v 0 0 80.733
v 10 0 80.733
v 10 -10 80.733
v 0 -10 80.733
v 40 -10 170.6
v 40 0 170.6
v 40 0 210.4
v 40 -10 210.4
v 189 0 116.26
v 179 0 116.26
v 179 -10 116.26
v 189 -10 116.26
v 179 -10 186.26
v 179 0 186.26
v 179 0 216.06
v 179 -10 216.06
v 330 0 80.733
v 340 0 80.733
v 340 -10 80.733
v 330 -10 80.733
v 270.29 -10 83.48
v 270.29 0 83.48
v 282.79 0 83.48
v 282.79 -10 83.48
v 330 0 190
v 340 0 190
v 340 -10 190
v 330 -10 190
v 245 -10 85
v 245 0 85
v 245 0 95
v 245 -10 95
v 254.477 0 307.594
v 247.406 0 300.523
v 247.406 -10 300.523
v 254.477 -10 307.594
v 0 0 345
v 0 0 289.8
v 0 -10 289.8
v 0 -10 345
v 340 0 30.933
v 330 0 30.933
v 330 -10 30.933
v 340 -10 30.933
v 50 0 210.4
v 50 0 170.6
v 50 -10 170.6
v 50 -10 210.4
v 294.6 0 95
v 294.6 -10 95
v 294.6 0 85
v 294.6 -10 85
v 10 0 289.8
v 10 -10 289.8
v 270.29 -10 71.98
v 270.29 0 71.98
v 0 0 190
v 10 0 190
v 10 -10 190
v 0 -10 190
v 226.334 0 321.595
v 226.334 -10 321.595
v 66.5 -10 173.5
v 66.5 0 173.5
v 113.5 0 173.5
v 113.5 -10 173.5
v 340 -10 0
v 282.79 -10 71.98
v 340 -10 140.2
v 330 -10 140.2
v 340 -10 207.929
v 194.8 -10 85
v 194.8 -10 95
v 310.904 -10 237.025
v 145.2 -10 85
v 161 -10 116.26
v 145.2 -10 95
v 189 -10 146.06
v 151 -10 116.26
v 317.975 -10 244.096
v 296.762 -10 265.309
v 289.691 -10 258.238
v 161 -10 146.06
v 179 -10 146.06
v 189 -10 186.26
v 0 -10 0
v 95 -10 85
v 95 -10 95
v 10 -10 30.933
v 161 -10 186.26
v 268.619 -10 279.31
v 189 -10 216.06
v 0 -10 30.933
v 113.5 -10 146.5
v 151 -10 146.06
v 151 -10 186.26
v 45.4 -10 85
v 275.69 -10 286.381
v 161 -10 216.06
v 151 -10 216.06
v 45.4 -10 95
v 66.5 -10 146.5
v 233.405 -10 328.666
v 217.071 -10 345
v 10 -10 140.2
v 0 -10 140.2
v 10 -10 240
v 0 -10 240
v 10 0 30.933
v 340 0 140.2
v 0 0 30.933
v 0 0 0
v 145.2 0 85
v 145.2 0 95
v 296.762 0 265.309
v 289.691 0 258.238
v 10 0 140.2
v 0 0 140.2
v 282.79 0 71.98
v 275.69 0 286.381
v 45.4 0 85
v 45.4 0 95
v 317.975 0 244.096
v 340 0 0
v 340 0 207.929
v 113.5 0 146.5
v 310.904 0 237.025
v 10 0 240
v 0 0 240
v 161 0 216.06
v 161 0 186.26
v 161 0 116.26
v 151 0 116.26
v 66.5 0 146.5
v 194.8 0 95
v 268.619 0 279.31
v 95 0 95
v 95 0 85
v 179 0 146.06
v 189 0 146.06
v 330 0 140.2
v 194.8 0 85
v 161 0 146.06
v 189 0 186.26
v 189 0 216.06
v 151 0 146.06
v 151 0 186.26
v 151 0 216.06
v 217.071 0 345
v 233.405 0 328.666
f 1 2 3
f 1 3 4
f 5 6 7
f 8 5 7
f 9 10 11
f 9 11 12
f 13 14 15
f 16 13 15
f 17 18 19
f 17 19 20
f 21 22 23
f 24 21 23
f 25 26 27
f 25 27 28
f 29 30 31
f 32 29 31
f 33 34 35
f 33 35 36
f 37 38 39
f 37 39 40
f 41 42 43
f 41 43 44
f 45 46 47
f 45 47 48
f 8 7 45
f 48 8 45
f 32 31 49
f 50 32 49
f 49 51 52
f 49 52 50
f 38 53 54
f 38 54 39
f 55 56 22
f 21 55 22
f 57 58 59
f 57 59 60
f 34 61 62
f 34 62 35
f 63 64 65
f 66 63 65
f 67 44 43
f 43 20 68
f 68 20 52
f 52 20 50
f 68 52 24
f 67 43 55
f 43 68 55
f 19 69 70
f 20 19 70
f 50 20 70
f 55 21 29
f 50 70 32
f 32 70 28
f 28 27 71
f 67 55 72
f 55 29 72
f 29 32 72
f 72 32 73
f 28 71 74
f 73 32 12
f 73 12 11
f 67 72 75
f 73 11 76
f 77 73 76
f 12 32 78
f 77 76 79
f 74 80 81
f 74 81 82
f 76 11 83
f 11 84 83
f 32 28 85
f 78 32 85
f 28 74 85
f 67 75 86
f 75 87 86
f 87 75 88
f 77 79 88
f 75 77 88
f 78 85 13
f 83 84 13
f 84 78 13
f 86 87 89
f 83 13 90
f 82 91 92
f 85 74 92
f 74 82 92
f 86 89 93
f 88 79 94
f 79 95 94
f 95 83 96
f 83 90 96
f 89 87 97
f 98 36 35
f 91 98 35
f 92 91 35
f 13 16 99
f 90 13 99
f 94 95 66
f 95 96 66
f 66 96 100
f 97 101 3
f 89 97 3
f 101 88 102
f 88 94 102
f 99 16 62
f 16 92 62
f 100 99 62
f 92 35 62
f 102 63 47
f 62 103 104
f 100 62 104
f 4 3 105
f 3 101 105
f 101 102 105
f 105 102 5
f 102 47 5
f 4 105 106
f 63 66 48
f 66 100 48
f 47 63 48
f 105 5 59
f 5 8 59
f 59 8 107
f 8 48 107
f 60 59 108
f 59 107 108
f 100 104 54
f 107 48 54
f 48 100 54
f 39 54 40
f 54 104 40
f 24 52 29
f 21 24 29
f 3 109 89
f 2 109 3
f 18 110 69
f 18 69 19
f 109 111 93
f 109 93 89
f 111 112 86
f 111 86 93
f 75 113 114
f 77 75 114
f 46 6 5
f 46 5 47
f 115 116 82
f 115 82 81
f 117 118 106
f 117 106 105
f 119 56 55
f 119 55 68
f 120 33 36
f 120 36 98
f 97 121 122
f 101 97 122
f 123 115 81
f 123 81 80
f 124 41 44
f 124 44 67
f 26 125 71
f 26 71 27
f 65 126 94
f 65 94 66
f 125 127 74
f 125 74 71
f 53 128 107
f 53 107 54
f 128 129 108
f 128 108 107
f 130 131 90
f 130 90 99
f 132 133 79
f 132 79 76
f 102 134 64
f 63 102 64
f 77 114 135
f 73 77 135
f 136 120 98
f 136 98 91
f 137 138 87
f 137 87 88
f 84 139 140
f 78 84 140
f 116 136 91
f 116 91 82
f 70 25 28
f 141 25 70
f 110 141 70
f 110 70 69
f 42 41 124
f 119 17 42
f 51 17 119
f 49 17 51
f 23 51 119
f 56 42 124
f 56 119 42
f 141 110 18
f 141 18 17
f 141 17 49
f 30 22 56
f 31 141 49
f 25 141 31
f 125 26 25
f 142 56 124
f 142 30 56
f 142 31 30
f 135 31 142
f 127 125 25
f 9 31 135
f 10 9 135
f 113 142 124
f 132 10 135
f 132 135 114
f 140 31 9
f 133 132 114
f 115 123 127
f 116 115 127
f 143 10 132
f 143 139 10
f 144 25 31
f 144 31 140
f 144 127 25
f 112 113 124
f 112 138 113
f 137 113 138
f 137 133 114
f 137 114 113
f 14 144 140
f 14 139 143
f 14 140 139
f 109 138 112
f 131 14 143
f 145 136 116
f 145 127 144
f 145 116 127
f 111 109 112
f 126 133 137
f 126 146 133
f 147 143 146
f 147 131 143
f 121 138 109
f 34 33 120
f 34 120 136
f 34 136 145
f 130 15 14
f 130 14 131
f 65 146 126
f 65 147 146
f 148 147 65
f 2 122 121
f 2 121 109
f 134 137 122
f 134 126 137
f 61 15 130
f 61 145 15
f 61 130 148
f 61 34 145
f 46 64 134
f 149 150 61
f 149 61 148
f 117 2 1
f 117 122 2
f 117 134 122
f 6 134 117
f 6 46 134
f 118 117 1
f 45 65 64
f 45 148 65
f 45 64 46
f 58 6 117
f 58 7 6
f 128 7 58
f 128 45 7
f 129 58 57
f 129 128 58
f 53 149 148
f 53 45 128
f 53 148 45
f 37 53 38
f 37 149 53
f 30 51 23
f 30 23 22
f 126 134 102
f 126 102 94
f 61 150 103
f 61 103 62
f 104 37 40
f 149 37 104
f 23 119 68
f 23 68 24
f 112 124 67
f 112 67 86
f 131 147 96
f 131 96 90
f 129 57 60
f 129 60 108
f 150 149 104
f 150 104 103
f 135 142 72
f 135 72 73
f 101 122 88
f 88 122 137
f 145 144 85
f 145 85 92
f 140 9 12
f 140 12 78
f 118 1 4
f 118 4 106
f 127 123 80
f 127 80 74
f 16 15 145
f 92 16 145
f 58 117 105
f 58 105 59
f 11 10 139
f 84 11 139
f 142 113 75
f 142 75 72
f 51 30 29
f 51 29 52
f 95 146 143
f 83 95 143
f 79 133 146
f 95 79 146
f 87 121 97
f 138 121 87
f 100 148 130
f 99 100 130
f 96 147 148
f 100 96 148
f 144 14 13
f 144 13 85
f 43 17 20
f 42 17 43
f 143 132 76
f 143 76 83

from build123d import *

# Parameters (mm, degrees)
SKETCH_W   = 49.6
SKETCH_H   = 10
SKETCH_W_2 = 10
SKETCH_H_2 = 39.8
SKETCH_W_3 = 47
SKETCH_H_3 = 27
SKETCH_H_4 = 29.8
SKETCH_W_4 = 12.5
SKETCH_H_5 = 11.5
PAD_DEPTH  = 10


with BuildPart() as part:
    # Sketch → Pad (new body)
    with BuildSketch(Plane.XZ):
        Polygon((0, 0), (0, 30.933), (10, 30.933), (10, 80.733), (0, 80.733), (0, 140.2), (10, 140.2), (10, 190), (0, 190), (0, 240), (10, 240), (10, 289.8), (0, 289.8), (0, 345), (217.0709, 345), (233.405067, 328.665833), (226.333999, 321.594766), (247.405781, 300.522983), (254.476849, 307.594051), (275.690052, 286.380848), (268.618985, 279.30978), (289.690767, 258.237998), (296.761835, 265.309066), (317.975038, 244.095862), (310.90397, 237.024795), (340, 207.928765), (340, 189.999765), (330, 189.999765), (330, 140.199765), (340, 140.199765), (340, 80.733), (330, 80.733), (330, 30.933), (340, 30.933), (340, 0), align=None)
        with Locations((70.2, 90)):
            Rectangle(SKETCH_W, SKETCH_H, mode=Mode.SUBTRACT)
        with Locations((170, 90)):
            Rectangle(SKETCH_W, SKETCH_H, mode=Mode.SUBTRACT)
        with Locations((269.8, 90)):
            Rectangle(SKETCH_W, SKETCH_H, mode=Mode.SUBTRACT)
        with Locations((45, 190.5)):
            Rectangle(SKETCH_W_2, SKETCH_H_2, mode=Mode.SUBTRACT)
        with Locations((90, 160)):
            Rectangle(SKETCH_W_3, SKETCH_H_3, mode=Mode.SUBTRACT)
        with Locations((156, 201.16)):
            Rectangle(SKETCH_W_2, SKETCH_H_4, mode=Mode.SUBTRACT)
        with Locations((184, 201.16)):
            Rectangle(SKETCH_W_2, SKETCH_H_4, mode=Mode.SUBTRACT)
        with Locations((156, 131.16)):
            Rectangle(SKETCH_W_2, SKETCH_H_4, mode=Mode.SUBTRACT)
        with Locations((184, 131.16)):
            Rectangle(SKETCH_W_2, SKETCH_H_4, mode=Mode.SUBTRACT)
        with Locations((276.54, 77.73)):
            Rectangle(SKETCH_W_4, SKETCH_H_5, mode=Mode.SUBTRACT)
    extrude(amount=PAD_DEPTH)


solid = part.part
